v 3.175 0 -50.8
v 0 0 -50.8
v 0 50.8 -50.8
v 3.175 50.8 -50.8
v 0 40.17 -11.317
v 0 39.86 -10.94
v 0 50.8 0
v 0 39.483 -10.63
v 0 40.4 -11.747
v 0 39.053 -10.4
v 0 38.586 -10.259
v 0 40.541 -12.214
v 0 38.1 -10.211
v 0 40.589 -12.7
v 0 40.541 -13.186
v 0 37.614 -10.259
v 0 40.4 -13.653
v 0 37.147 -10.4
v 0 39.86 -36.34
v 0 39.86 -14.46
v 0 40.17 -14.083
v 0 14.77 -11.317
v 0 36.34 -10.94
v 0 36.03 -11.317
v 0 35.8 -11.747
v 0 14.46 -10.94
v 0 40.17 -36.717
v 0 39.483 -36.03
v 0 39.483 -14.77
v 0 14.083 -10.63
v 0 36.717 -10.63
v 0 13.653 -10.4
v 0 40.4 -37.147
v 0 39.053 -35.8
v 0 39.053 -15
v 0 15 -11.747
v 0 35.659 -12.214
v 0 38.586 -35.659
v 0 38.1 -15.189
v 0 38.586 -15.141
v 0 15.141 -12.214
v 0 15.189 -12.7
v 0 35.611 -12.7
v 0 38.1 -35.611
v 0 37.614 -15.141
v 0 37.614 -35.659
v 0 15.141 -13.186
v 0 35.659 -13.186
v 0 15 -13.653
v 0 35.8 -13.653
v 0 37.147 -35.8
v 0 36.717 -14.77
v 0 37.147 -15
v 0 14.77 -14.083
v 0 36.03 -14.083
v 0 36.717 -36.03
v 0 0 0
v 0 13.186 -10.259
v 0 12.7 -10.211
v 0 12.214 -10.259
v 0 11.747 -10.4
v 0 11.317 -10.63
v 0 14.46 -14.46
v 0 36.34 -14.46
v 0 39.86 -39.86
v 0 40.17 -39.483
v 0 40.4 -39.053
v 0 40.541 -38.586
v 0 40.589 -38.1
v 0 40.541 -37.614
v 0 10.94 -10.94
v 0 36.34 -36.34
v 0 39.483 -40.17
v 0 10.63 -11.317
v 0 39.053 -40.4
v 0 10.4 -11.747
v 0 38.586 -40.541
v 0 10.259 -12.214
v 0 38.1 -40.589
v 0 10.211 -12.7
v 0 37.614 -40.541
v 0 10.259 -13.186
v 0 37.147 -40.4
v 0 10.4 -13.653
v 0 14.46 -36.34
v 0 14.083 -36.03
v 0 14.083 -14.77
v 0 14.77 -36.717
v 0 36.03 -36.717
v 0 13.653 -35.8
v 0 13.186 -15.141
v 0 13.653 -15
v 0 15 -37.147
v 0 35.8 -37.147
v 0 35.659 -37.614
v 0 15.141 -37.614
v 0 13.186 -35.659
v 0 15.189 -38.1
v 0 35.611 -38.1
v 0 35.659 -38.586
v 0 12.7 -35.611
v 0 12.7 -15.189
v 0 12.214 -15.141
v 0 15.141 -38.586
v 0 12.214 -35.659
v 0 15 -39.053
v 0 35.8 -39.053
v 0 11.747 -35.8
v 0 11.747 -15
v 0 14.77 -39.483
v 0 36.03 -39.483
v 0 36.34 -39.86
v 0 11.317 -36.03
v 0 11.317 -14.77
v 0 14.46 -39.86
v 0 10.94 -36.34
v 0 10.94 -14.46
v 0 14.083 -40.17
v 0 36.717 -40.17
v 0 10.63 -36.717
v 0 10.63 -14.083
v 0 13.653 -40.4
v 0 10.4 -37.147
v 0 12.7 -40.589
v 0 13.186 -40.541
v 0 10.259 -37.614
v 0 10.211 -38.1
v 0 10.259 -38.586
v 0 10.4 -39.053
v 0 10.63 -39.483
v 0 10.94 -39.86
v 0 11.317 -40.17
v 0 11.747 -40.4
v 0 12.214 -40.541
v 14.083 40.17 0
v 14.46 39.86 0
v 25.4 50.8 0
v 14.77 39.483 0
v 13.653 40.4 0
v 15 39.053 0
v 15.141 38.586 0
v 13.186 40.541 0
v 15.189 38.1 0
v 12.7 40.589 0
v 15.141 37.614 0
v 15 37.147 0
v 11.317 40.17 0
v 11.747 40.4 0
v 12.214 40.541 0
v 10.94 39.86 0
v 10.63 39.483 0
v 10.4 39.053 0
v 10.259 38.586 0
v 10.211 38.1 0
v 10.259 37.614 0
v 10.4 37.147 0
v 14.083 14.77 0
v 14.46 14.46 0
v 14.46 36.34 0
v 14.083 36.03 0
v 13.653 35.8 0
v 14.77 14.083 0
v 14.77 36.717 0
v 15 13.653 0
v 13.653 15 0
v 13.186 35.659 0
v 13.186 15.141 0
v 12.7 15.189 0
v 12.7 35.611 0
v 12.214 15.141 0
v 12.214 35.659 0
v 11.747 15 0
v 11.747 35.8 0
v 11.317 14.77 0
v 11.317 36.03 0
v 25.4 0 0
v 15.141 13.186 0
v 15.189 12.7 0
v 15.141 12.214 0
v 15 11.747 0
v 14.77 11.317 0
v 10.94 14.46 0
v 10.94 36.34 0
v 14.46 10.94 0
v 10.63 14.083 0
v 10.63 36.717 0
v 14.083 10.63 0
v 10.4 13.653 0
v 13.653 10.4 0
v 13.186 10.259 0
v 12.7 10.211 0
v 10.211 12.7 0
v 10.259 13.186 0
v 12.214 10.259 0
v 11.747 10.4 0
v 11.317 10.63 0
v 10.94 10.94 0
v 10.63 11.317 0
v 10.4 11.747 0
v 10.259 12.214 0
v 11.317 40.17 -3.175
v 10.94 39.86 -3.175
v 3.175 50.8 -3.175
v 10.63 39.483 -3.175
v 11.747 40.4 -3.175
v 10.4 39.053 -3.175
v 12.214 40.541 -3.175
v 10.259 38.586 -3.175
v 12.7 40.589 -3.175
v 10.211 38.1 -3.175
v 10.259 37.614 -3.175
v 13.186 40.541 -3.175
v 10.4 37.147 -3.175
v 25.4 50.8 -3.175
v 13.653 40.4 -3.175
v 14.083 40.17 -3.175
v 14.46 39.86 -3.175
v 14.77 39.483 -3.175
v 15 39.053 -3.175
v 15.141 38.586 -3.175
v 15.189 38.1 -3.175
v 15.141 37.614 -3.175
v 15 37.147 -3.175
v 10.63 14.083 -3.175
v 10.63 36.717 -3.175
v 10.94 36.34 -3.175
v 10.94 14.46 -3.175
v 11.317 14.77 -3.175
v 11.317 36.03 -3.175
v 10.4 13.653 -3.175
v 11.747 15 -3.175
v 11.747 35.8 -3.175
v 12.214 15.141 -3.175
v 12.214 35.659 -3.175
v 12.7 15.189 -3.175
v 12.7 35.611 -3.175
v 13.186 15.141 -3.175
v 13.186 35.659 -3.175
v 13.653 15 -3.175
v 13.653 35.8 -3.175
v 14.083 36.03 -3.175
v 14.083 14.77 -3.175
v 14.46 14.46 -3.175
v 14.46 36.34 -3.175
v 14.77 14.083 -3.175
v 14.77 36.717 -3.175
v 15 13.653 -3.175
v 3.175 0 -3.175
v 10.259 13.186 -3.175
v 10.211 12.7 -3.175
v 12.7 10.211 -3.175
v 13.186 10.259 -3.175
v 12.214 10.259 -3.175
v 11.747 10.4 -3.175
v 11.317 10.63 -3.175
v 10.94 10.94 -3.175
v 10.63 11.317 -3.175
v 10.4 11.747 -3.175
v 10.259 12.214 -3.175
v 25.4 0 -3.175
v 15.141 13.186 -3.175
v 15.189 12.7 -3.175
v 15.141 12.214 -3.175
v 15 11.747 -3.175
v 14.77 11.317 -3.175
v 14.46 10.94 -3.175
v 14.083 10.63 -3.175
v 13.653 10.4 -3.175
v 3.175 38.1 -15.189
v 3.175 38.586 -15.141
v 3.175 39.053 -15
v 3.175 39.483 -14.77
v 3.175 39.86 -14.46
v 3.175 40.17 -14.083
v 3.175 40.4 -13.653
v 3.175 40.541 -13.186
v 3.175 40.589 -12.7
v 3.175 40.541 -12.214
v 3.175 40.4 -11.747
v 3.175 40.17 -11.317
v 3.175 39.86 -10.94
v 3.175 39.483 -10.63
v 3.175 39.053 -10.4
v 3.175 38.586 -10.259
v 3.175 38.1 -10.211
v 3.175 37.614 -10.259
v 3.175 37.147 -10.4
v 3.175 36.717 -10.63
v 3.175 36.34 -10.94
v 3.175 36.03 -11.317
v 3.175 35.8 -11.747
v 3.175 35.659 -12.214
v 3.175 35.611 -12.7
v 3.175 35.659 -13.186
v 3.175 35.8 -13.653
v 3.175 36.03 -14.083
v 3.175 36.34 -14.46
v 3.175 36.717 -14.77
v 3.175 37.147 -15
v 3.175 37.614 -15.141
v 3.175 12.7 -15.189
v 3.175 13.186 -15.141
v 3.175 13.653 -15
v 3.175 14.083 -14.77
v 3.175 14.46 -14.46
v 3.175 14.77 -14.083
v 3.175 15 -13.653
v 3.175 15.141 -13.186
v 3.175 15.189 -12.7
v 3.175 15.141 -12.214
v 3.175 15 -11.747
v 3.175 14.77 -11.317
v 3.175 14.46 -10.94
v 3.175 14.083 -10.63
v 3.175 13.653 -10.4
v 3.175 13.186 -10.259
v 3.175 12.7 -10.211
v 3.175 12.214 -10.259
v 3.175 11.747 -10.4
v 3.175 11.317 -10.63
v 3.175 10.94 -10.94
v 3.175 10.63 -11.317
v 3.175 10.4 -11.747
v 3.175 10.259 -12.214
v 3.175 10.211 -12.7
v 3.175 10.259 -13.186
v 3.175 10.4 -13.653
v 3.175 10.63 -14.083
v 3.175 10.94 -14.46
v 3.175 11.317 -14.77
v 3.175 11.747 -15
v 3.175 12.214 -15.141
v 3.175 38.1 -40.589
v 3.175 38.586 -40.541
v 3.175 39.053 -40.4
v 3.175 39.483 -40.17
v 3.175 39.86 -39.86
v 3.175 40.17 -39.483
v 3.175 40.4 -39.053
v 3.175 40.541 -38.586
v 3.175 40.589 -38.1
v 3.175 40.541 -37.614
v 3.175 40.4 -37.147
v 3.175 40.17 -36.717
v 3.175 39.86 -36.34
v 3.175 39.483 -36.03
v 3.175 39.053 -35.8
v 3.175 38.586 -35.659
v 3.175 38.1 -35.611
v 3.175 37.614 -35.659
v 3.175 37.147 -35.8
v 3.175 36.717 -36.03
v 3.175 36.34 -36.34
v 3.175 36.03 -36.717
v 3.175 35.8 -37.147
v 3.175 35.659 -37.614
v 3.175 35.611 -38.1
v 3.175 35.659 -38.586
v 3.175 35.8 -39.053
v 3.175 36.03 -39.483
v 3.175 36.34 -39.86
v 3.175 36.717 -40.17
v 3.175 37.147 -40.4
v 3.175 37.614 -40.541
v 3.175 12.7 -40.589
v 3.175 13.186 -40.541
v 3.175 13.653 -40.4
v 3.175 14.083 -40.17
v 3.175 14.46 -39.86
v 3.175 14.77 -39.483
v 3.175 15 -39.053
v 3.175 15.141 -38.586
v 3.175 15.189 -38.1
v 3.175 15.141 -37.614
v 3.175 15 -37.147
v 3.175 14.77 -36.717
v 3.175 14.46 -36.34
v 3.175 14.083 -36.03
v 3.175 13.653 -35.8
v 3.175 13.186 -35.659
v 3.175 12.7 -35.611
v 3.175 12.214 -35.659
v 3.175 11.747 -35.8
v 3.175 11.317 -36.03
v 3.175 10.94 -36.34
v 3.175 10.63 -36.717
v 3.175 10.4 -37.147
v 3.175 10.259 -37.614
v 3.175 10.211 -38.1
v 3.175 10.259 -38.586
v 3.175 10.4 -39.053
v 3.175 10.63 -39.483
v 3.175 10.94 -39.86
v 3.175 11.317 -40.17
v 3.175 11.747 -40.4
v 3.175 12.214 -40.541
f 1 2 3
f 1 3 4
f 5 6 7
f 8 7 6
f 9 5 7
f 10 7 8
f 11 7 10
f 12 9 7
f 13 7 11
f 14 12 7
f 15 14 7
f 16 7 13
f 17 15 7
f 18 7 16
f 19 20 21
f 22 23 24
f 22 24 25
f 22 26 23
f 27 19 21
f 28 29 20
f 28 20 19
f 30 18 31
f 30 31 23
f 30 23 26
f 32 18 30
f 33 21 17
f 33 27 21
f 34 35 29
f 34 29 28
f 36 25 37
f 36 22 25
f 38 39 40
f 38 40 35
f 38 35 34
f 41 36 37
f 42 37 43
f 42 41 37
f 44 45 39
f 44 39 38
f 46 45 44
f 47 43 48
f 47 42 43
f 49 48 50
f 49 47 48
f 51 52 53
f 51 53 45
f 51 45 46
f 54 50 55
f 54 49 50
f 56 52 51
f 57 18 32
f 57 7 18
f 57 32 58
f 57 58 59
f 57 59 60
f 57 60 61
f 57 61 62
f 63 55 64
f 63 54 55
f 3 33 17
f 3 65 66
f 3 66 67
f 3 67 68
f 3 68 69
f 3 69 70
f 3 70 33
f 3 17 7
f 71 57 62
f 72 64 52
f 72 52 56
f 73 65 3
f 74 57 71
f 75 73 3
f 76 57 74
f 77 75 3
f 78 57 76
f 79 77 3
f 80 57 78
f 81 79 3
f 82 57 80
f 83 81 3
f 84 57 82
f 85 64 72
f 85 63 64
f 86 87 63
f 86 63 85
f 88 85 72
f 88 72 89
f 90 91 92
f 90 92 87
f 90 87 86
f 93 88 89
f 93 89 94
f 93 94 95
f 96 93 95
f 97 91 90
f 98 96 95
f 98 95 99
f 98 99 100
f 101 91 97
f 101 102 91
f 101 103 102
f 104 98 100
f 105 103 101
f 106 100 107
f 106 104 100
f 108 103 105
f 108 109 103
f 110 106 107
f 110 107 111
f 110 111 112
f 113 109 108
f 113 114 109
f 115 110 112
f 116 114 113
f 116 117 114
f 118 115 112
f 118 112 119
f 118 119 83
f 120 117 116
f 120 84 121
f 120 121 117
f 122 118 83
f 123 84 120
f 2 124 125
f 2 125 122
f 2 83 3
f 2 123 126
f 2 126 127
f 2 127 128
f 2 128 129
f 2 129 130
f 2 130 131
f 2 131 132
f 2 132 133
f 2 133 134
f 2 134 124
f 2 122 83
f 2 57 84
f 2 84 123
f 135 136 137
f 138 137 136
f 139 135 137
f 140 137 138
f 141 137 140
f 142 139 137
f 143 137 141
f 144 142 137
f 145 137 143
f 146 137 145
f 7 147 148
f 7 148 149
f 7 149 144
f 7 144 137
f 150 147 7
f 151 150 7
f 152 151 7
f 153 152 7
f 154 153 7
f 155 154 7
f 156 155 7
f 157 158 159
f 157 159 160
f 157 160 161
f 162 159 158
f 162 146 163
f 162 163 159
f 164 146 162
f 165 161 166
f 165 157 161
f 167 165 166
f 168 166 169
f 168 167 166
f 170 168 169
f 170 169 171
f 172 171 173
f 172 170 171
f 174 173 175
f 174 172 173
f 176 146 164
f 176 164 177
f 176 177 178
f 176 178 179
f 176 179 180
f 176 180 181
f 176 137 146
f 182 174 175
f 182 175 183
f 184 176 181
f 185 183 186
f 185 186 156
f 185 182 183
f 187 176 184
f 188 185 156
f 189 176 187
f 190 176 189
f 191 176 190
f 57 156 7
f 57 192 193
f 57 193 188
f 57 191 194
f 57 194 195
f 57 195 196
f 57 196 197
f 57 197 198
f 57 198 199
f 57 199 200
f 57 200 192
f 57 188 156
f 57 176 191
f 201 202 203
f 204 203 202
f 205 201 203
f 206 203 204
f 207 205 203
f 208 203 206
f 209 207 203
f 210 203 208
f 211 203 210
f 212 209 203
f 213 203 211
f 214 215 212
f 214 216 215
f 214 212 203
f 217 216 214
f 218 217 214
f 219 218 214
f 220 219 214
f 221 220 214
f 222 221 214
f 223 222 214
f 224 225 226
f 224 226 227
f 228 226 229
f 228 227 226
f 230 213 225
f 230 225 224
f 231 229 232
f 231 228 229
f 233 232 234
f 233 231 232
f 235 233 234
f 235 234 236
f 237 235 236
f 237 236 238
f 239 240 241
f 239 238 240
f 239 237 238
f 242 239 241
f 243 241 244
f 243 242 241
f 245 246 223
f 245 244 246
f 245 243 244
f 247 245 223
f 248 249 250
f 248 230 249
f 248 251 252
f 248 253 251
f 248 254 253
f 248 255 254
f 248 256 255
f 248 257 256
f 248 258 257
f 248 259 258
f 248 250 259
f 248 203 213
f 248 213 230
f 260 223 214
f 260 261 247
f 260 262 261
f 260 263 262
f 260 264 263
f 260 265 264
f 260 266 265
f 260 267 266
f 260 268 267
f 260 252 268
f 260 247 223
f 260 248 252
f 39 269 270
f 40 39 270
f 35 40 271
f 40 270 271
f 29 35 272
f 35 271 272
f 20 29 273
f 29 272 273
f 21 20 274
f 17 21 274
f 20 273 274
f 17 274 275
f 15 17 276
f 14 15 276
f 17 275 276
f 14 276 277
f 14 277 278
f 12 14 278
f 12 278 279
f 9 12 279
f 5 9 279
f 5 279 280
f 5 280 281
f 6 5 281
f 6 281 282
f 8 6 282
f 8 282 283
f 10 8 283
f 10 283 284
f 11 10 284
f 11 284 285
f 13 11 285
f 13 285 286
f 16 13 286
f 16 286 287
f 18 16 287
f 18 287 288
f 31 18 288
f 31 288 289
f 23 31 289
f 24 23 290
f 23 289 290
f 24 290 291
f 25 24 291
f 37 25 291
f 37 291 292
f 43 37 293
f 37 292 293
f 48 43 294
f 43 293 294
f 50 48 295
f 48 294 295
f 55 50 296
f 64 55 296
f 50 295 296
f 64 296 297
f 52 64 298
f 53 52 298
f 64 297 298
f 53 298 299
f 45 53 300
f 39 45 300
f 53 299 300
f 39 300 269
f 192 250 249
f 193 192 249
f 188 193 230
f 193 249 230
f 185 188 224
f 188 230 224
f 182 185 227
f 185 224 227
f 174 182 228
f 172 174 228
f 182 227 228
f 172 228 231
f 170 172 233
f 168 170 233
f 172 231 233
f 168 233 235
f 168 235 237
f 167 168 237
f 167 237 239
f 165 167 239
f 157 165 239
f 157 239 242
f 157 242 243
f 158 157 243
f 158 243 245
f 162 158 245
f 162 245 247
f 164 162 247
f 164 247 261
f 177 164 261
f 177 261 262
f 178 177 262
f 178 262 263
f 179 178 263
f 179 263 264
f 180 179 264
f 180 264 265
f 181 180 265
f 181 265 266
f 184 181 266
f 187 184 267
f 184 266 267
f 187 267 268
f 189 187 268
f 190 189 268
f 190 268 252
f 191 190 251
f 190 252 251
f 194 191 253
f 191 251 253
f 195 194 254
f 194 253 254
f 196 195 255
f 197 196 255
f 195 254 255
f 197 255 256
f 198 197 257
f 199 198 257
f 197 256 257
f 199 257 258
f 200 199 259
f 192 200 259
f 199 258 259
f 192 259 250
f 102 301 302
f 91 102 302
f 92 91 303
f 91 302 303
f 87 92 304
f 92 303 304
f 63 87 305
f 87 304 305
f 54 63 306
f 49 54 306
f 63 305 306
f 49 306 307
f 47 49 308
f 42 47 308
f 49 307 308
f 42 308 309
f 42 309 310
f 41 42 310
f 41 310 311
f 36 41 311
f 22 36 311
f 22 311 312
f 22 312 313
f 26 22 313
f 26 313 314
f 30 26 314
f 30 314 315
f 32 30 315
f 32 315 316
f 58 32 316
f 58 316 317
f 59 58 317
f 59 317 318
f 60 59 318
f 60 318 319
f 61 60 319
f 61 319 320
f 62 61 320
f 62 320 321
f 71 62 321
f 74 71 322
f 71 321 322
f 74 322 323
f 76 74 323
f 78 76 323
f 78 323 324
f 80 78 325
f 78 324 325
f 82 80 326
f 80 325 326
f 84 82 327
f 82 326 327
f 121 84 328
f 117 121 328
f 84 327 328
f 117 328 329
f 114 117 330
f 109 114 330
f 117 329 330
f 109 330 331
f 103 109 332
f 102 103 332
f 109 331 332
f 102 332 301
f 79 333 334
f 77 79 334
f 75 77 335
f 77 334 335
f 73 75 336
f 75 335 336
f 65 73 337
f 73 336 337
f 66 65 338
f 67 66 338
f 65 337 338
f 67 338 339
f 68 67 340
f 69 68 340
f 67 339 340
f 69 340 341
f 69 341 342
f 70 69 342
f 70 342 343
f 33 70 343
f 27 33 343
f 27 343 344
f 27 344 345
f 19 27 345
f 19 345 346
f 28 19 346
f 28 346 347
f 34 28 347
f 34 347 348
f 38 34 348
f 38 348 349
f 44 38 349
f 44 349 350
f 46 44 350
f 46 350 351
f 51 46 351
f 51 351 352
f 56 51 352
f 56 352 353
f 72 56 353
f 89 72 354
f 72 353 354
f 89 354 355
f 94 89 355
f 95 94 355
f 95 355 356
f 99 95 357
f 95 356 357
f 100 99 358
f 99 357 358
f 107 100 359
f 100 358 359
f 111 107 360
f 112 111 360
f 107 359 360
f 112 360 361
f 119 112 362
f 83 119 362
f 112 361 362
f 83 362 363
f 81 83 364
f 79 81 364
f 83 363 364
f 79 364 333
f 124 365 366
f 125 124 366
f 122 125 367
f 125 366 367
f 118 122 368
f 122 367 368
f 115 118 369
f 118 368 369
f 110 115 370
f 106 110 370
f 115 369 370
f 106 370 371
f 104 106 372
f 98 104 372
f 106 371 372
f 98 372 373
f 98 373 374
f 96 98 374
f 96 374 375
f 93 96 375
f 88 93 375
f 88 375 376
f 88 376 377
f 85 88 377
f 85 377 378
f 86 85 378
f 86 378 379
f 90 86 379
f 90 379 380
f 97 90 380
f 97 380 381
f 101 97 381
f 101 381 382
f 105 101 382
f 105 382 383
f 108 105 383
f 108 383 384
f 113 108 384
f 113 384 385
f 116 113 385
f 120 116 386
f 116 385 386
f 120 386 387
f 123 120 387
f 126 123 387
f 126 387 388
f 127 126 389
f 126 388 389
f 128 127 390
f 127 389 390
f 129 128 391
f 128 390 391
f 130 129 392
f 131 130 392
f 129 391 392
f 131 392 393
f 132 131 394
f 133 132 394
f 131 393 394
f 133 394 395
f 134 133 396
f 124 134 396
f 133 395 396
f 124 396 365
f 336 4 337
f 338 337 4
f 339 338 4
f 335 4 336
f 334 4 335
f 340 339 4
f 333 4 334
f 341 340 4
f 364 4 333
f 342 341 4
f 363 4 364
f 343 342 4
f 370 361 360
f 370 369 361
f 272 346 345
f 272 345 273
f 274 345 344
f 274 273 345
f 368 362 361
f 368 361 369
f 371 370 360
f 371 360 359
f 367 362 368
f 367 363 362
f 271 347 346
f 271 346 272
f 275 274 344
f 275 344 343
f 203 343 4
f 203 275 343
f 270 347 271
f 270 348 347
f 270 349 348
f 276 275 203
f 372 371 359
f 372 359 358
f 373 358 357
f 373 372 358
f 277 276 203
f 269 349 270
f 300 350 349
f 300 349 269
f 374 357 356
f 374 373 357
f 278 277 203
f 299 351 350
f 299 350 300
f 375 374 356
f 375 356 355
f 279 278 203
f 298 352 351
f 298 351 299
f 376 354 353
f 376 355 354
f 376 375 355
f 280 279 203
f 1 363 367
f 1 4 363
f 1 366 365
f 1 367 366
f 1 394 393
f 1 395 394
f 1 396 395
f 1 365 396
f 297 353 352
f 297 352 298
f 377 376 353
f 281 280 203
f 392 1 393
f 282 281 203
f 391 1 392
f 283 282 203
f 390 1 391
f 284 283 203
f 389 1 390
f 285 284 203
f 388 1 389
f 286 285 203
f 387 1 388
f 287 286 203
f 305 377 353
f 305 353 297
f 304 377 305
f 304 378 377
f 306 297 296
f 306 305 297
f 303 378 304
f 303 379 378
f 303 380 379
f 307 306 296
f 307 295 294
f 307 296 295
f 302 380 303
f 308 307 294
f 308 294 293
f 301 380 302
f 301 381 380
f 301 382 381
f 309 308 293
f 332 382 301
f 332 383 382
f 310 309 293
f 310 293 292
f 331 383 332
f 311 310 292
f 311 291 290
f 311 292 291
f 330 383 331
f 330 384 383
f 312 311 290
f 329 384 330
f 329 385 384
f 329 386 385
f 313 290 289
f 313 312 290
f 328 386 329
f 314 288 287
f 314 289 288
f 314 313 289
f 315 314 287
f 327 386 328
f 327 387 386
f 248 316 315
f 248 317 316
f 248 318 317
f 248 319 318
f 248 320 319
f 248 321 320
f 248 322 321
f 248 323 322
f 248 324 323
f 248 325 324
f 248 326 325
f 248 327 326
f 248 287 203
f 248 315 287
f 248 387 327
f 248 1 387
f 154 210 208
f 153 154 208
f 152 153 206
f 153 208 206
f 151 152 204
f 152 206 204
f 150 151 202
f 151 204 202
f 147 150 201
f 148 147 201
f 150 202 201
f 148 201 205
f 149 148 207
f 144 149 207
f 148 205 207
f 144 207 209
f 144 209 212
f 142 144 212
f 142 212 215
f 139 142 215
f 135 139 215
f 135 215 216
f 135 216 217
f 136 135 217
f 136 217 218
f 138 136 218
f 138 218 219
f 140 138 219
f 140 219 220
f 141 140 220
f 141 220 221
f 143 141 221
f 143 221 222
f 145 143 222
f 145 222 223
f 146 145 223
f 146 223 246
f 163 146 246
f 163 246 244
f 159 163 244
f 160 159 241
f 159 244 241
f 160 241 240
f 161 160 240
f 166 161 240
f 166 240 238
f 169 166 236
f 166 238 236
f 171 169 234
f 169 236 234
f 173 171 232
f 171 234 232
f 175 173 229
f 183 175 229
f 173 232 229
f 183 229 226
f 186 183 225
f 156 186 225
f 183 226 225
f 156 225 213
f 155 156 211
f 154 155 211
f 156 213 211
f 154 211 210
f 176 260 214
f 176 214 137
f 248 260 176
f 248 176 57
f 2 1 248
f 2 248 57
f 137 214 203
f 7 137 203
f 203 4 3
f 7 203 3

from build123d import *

# Parameters (mm, degrees)
BOSS_EXTRUDE1_DEPTH = 50.8
SKETCH2_R           = 2.4892
CUT_EXTRUDE1_DEPTH  = 76.201267443
SKETCH3_R           = 2.4892
CUT_EXTRUDE2_DEPTH  = 75.121121315


with BuildPart() as part:
    # Sketch1 → Boss-Extrude1 (new body)
    with BuildSketch(Plane(origin=(0, 0, 0), x_dir=(1, 0, 0), z_dir=(0, 1, 0))):
        Polygon((0, 0), (0, 50.8), (3.175, 50.8), (3.175, 3.175), (25.4, 3.175), (25.4, 0), align=None)
    extrude(amount=BOSS_EXTRUDE1_DEPTH)

    # Sketch2 → Cut-Extrude1 (cut, through all)
    with BuildSketch(Plane(origin=(3.175, 0, 0), x_dir=(0, 0, -1), z_dir=(1, 0, 0))):
        with Locations((38.1, 38.1)):
            Circle(SKETCH2_R)
        with Locations((38.1, 12.7)):
            Circle(SKETCH2_R)
        with Locations((12.7, 12.7)):
            Circle(SKETCH2_R)
        with Locations((12.7, 38.1)):
            Circle(SKETCH2_R)
    extrude(amount=-CUT_EXTRUDE1_DEPTH, mode=Mode.SUBTRACT)

    # Sketch3 → Cut-Extrude2 (cut, through all)
    with BuildSketch(Plane(origin=(0, 0, -3.175), x_dir=(-1, 0, 0), z_dir=(0, 0, -1))):
        with Locations((-12.7, 38.1)):
            Circle(SKETCH3_R)
        with Locations((-12.7, 12.7)):
            Circle(SKETCH3_R)
    extrude(amount=-CUT_EXTRUDE2_DEPTH, mode=Mode.SUBTRACT)


solid = part.part
